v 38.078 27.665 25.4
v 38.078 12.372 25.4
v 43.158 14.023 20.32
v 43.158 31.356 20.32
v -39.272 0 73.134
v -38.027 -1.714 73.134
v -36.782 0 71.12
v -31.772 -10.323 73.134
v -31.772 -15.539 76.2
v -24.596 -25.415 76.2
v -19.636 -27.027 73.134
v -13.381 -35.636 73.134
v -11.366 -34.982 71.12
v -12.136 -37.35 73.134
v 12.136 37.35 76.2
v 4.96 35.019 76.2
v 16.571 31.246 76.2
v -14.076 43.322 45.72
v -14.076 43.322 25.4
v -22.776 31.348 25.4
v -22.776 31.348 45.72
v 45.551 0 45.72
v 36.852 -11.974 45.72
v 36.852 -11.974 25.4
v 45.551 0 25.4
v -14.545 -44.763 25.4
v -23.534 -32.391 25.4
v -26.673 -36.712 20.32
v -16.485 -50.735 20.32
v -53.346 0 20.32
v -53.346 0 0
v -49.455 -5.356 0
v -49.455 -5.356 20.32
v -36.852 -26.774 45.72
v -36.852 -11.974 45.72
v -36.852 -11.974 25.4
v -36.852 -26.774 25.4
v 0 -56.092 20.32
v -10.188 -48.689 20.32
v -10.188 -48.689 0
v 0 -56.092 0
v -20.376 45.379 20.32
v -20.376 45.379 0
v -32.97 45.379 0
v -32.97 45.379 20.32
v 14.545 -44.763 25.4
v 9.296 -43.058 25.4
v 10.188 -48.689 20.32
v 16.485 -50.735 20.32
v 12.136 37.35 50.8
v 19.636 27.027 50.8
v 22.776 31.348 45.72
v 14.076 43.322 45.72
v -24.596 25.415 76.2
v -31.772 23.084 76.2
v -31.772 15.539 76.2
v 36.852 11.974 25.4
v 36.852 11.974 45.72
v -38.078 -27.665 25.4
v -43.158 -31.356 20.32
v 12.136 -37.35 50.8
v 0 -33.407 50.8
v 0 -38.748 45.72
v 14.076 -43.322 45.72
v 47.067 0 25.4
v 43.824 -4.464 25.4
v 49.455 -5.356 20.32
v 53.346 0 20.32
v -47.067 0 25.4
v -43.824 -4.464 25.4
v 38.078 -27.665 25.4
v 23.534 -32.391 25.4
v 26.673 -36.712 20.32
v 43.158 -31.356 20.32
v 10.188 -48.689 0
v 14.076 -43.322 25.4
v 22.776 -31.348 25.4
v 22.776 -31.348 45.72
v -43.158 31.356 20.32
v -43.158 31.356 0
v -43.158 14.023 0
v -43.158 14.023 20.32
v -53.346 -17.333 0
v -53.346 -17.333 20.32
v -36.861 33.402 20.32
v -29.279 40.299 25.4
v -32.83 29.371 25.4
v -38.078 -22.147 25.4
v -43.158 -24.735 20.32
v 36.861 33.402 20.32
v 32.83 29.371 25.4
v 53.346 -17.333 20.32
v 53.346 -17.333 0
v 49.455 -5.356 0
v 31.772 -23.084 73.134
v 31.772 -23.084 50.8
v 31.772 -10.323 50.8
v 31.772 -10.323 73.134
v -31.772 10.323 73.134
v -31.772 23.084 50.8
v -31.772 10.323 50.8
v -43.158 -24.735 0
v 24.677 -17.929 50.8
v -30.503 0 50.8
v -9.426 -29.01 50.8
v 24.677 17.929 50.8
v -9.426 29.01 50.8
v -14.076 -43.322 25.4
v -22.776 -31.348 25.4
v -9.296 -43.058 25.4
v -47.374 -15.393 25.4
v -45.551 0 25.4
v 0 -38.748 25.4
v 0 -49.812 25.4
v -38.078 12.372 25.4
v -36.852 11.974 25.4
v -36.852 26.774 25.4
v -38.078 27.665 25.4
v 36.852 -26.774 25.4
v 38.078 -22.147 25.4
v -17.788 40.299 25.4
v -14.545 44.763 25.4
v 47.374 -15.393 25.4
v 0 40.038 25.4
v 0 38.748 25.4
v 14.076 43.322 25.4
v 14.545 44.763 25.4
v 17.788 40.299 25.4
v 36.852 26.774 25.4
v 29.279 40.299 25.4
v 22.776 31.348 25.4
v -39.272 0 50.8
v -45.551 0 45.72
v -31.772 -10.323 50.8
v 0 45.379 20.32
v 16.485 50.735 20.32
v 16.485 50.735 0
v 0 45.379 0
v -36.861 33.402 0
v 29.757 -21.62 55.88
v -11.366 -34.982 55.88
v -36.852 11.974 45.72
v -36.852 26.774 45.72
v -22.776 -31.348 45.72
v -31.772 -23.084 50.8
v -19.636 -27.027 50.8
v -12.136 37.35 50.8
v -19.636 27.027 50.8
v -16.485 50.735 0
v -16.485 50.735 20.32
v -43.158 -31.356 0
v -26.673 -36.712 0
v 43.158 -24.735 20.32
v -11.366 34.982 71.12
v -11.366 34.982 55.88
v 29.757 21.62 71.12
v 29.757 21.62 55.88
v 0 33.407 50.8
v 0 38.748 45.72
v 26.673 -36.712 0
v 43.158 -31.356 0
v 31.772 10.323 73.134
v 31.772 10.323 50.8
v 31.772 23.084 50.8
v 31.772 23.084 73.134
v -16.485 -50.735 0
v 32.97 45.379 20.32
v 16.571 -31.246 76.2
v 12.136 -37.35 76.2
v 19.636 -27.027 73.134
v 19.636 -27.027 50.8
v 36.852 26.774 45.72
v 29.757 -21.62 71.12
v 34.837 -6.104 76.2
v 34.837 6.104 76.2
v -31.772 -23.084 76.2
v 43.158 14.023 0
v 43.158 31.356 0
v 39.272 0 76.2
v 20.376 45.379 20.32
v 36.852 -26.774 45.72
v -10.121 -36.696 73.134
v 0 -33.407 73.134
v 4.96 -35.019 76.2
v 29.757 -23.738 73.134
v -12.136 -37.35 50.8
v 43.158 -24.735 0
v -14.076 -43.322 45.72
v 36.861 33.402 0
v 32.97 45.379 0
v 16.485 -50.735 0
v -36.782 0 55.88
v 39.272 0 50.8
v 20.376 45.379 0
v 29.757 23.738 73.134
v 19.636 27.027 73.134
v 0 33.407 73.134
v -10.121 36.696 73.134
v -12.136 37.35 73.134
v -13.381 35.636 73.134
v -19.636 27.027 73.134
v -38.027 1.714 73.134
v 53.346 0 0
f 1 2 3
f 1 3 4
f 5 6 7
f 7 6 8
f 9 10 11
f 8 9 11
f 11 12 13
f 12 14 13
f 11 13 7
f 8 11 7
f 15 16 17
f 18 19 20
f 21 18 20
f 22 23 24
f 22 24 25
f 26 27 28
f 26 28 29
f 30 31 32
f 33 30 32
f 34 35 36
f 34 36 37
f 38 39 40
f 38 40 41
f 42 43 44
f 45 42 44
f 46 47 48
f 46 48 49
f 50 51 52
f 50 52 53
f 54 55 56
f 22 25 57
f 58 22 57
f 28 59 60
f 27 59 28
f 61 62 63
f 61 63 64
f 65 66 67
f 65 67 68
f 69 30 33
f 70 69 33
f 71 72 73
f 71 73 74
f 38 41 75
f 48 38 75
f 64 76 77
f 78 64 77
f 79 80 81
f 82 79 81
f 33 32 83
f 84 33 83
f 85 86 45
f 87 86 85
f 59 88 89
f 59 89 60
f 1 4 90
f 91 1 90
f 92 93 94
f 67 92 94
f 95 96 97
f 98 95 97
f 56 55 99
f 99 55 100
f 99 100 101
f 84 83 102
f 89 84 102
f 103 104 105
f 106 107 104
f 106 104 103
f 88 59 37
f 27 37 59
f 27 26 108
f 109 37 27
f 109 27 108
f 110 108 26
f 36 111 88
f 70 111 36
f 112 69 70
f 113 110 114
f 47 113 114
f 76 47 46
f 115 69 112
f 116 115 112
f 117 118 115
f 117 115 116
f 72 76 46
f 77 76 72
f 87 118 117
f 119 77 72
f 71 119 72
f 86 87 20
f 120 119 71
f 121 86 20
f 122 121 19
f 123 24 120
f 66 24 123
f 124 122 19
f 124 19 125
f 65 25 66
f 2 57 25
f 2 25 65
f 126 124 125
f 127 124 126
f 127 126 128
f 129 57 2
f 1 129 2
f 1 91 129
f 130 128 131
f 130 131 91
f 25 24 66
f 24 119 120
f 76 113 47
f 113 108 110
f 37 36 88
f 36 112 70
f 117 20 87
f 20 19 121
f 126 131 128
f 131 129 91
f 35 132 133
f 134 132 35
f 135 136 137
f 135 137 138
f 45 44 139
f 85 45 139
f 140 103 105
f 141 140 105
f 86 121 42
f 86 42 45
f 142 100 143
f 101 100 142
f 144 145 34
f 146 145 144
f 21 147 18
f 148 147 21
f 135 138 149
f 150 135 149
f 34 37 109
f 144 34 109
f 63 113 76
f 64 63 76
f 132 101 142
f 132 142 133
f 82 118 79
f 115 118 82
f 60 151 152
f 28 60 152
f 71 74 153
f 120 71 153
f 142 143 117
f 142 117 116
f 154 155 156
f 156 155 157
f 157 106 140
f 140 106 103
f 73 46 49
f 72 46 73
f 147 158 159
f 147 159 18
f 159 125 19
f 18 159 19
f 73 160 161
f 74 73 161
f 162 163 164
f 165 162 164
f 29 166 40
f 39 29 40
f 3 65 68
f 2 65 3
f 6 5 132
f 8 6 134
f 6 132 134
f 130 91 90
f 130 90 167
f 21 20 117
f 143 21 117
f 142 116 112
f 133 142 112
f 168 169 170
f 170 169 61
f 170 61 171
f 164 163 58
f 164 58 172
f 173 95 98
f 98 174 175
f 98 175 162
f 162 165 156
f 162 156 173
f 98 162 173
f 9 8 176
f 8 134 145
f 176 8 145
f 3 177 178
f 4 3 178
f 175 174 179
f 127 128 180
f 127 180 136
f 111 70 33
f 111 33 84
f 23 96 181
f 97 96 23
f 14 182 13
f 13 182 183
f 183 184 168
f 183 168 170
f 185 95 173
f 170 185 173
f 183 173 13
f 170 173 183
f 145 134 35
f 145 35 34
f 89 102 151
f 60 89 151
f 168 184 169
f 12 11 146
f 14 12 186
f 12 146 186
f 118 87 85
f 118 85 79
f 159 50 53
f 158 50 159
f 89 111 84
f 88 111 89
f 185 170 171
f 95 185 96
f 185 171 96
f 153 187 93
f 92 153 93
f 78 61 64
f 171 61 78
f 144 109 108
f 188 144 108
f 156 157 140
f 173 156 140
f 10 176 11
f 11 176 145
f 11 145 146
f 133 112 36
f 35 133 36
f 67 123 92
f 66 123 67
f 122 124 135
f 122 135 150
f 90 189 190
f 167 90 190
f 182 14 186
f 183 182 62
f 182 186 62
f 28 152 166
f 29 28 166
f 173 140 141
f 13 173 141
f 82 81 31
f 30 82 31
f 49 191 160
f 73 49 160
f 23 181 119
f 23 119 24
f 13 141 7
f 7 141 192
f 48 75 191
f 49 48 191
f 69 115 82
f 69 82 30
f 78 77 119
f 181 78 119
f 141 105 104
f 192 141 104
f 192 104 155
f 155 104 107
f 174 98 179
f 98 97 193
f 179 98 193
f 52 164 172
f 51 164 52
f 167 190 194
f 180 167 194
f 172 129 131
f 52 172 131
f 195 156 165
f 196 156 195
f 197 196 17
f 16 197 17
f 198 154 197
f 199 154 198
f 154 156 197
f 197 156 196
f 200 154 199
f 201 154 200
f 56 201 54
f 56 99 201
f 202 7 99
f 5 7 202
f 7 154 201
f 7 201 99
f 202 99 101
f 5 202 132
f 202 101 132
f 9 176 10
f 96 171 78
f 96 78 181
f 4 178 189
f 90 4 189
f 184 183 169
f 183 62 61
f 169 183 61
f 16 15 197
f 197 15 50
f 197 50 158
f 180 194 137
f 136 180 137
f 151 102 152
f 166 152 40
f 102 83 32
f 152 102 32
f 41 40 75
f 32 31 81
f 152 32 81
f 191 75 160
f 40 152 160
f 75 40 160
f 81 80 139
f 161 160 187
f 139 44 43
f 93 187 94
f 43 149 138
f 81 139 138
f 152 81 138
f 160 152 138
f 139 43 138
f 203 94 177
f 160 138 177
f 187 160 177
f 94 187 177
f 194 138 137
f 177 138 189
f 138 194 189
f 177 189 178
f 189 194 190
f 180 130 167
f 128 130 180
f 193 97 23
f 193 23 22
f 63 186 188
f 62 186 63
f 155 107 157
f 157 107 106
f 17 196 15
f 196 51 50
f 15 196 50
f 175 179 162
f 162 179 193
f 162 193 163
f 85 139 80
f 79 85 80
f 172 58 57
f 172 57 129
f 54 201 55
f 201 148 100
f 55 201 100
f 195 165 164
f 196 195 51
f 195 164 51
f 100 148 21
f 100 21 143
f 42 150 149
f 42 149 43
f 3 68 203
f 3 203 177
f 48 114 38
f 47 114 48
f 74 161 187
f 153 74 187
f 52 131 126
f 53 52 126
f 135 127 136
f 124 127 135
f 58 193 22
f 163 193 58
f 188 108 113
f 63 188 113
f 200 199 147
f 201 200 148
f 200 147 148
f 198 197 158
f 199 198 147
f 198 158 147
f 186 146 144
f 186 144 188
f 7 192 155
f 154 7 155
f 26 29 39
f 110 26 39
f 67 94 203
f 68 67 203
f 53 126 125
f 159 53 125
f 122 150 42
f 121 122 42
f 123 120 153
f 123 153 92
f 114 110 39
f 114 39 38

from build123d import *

# Parameters (mm, degrees)
F1_DEPTH      = 25.4
F2_SIZE       = 5.08
F4_DEPTH      = 25.4
F5_SIZE       = 5.08
F7_DEPTH      = 25.4
F8_SIZE       = 5.08
F9_T4_DEPTH   = 69.3683527658
F9_T10_DEPTH  = 69.3683527658
F9_T16_DEPTH  = 69.3683527658
F9_T22_DEPTH  = 69.3683527658
F9_T28_DEPTH  = 69.3683527658
F9_T35_DEPTH  = 69.3683527658
F9_T41_DEPTH  = 69.3683527658
F9_T50_DEPTH  = 69.3683527658
F9_T56_DEPTH  = 69.3683527658
F9_T65_DEPTH  = 69.3683527658
F9_T71_DEPTH  = 69.3683527658
F9_T80_DEPTH  = 69.3683527658
F9_T86_DEPTH  = 69.3683527658
F9_T95_DEPTH  = 69.3683527658
F9_T101_DEPTH = 69.3683527658


# Not quite as in the source:
# - a fillet or chamfer that OpenCascade refuses, or shapes differently, is made with other operations: its cross-section is extruded or revolved along the edge and cut away or added


with BuildPart() as f1:
    # F0 (on Top) → F1 (new body)
    with BuildSketch(Plane.XY):
        Polygon((43.1581027806, 14.0229176455), (43.1581027806, 31.3561970981), (36.8614204445, 33.40211321), align=None)
        Polygon((49.4547851167, -5.3562779191), (43.1581027806, 14.0229176455), (43.1581027806, -14.0229176455), align=None)
        Polygon((43.1581027806, -14.0229176455), (43.1581027806, 14.0229176455), (26.6731744084, 36.7124750172), (0, 45.3791147436), (-26.6731744084, 36.7124750172), (-43.1581027806, 14.0229176455), (-43.1581027806, -14.0229176455), (-26.6731744084, -36.7124750172), (0, -45.3791147436), (26.6731744084, -36.7124750172), align=None)
        Polygon((26.6731744084, 36.7124750172), (43.1581027806, 14.0229176455), (36.8614204445, 33.40211321), align=None)
        Polygon((53.3463488167, 0), (43.1581027806, 14.0229176455), (49.4547851167, -5.3562779191), align=None)
        Polygon((26.6731744084, 36.7124750172), (36.8614204445, 33.40211321), (32.9698567444, 45.3791147436), (20.3764920723, 45.3791147436), align=None)
        Polygon((49.4547851167, -5.3562779191), (43.1581027806, -14.0229176455), (43.1581027806, -24.7354734837), (53.3463488167, -17.3332794527), align=None)
        Polygon((43.1581027806, -24.7354734837), (43.1581027806, -14.0229176455), (26.6731744084, -36.7124750172), align=None)
        Polygon((0, 45.3791147436), (26.6731744084, 36.7124750172), (20.3764920723, 45.3791147436), align=None)
        Polygon((43.1581027806, -31.3561970981), (43.1581027806, -24.7354734837), (26.6731744084, -36.7124750172), align=None)
        Polygon((10.1882460361, -48.6894765508), (26.6731744084, -36.7124750172), (0, -45.3791147436), align=None)
        Polygon((16.4849283722, -50.7353926627), (26.6731744084, -36.7124750172), (10.1882460361, -48.6894765508), align=None)
        Polygon((-20.3764920723, 45.3791147436), (0, 45.3791147436), (-16.4849283722, 50.7353926627), align=None)
        Polygon((-26.6731744084, 36.7124750172), (0, 45.3791147436), (-20.3764920723, 45.3791147436), align=None)
        Polygon((16.4849283722, 50.7353926627), (0, 45.3791147436), (20.3764920723, 45.3791147436), align=None)
        Polygon((10.1882460361, -48.6894765508), (0, -45.3791147436), (-10.1882460361, -48.6894765508), (0, -56.0916705818), align=None)
        Polygon((-10.1882460361, -48.6894765508), (0, -45.3791147436), (-26.6731744084, -36.7124750172), align=None)
        Polygon((-36.8614204445, 33.40211321), (-26.6731744084, 36.7124750172), (-20.3764920723, 45.3791147436), (-32.9698567444, 45.3791147436), align=None)
        Polygon((-43.1581027806, 14.0229176455), (-26.6731744084, 36.7124750172), (-36.8614204445, 33.40211321), align=None)
        Polygon((-16.4849283722, -50.7353926627), (-10.1882460361, -48.6894765508), (-26.6731744084, -36.7124750172), align=None)
        Polygon((-43.1581027806, -24.7354734837), (-26.6731744084, -36.7124750172), (-43.1581027806, -14.0229176455), align=None)
        Polygon((-43.1581027806, -31.3561970981), (-26.6731744084, -36.7124750172), (-43.1581027806, -24.7354734837), align=None)
        Polygon((-49.4547851167, -5.3562779191), (-43.1581027806, 14.0229176455), (-53.3463488167, 0), align=None)
        Polygon((-43.1581027806, -14.0229176455), (-43.1581027806, 14.0229176455), (-49.4547851167, -5.3562779191), align=None)
        Polygon((-43.1581027806, 31.3561970981), (-43.1581027806, 14.0229176455), (-36.8614204445, 33.40211321), align=None)
        Polygon((-43.1581027806, -24.7354734837), (-43.1581027806, -14.0229176455), (-49.4547851167, -5.3562779191), (-53.3463488167, -17.3332794527), align=None)
    extrude(amount=F1_DEPTH)

    # F2
    f2_edges = [f1.edges().sort_by_distance(p)[0] for p in [
        (43.158103, 22.689557, 25.4),
        (40.009762, 32.379155, 25.4),
        (34.915639, 39.390614, 25.4),
        (26.673174, 45.379115, 25.4),
        (18.43071, 48.057254, 25.4),
        (8.242464, 48.057254, 25.4),
        (-8.242464, 48.057254, 25.4),
        (-18.43071, 48.057254, 25.4),
        (-26.673174, 45.379115, 25.4),
        (-34.915639, 39.390614, 25.4),
        (-40.009762, 32.379155, 25.4),
        (-43.158103, 22.689557, 25.4),
        (-48.252226, 7.011459, 25.4),
        (-51.400567, -2.678139, 25.4),
        (-51.400567, -11.344779, 25.4),
        (-48.252226, -21.034376, 25.4),
        (-43.158103, -28.045835, 25.4),
        (-34.915639, -34.034336, 25.4),
        (-21.579051, -43.723934, 25.4),
        (-13.336587, -49.712435, 25.4),
        (-5.094123, -52.390574, 25.4),
        (5.094123, -52.390574, 25.4),
        (13.336587, -49.712435, 25.4),
        (21.579051, -43.723934, 25.4),
        (34.915639, -34.034336, 25.4),
        (43.158103, -28.045835, 25.4),
        (48.252226, -21.034376, 25.4),
        (51.400567, -11.344779, 25.4),
        (51.400567, -2.678139, 25.4),
        (48.252226, 7.011459, 25.4),
    ]]
    chamfer(f2_edges, length=F2_SIZE)

    # F3 (on face) → F4 (join)
    with BuildSketch(Plane.XY.offset(25.4)):
        Polygon((36.8518978357, 11.9739074504), (36.8518978357, 26.7744710154), (22.7757254124, 31.3480966833), align=None)
        Polygon((45.5514508248, 0), (36.8518978357, 11.9739074504), (36.8518978357, -11.9739074504), align=None)
        Polygon((36.8518978357, -11.9739074504), (36.8518978357, 11.9739074504), (22.7757254124, 31.3480966833), (0, 38.7483784658), (-22.7757254124, 31.3480966833), (-36.8518978357, 11.9739074504), (-36.8518978357, -11.9739074504), (-22.7757254124, -31.3480966833), (0, -38.7483784658), (22.7757254124, -31.3480966833), align=None)
        Polygon((0, 38.7483784658), (22.7757254124, 31.3480966833), (14.0761724233, 43.3220041337), align=None)
        Polygon((36.8518978357, -26.7744710154), (36.8518978357, -11.9739074504), (22.7757254124, -31.3480966833), align=None)
        Polygon((-22.7757254124, 31.3480966833), (0, 38.7483784658), (-14.0761724233, 43.3220041337), align=None)
        Polygon((14.0761724233, -43.3220041337), (22.7757254124, -31.3480966833), (0, -38.7483784658), align=None)
        Polygon((-36.8518978357, 11.9739074504), (-22.7757254124, 31.3480966833), (-36.8518978357, 26.7744710154), align=None)
        Polygon((-14.0761724233, -43.3220041337), (0, -38.7483784658), (-22.7757254124, -31.3480966833), align=None)
        Polygon((-36.8518978357, -11.9739074504), (-36.8518978357, 11.9739074504), (-45.5514508248, 0), align=None)
        Polygon((-36.8518978357, -26.7744710154), (-22.7757254124, -31.3480966833), (-36.8518978357, -11.9739074504), align=None)
    extrude(amount=F4_DEPTH)

    # F5
    f5_edges = [f1.edges().sort_by_distance(p)[0] for p in [
        (36.851898, 19.374189, 50.8),
        (29.813812, 29.061284, 50.8),
        (18.425949, 37.33505, 50.8),
        (7.038086, 41.035191, 50.8),
        (-7.038086, 41.035191, 50.8),
        (-18.425949, 37.33505, 50.8),
        (-29.813812, 29.061284, 50.8),
        (-36.851898, 19.374189, 50.8),
        (-41.201674, 5.986954, 50.8),
        (-41.201674, -5.986954, 50.8),
        (-36.851898, -19.374189, 50.8),
        (-29.813812, -29.061284, 50.8),
        (-18.425949, -37.33505, 50.8),
        (-7.038086, -41.035191, 50.8),
        (7.038086, -41.035191, 50.8),
        (18.425949, -37.33505, 50.8),
        (29.813812, -29.061284, 50.8),
        (36.851898, -19.374189, 50.8),
        (41.201674, -5.986954, 50.8),
        (41.201674, 5.986954, 50.8),
    ]]
    chamfer(f5_edges, length=F5_SIZE)

    # F6 (on face) → F7 (join)
    with BuildSketch(Plane.XY.offset(50.8)):
        Polygon((39.2722254991, 0), (31.7718978357, 10.3233153935), (31.7718978357, 23.0836349731), (19.6361127496, 27.0267905768), (12.1357850862, 37.3501059704), (0, 33.4069503666), (-12.1357850862, 37.3501059704), (-19.6361127496, 27.0267905768), (-31.7718978357, 23.0836349731), (-31.7718978357, 10.3233153935), (-39.2722254991, 0), (-31.7718978357, -10.3233153935), (-31.7718978357, -23.0836349731), (-19.6361127496, -27.0267905768), (-12.1357850862, -37.3501059704), (0, -33.4069503666), (12.1357850862, -37.3501059704), (19.6361127496, -27.0267905768), (31.7718978357, -23.0836349731), (31.7718978357, -10.3233153935), align=None)
        Polygon((-11.3663207357, 34.9819382066), (29.7574140131, 21.620026804), (29.7574140131, -21.620026804), (-11.3663207357, -34.9819382066), (-36.7821865549, 0), align=None, mode=Mode.SUBTRACT)
    extrude(amount=F7_DEPTH)

    # F8
    f8_edges = [f1.edges().sort_by_distance(p)[0] for p in [
        (9.195547, 28.300983, 50.8),
        (29.757414, 0, 50.8),
        (9.195547, -28.300983, 50.8),
        (-24.074254, -17.490969, 50.8),
        (-24.074254, 17.490969, 50.8),
    ]]
    chamfer(f8_edges, length=F8_SIZE)

    # F9: chamfer of 5.08 on 5 edges, made by hand


with BuildPart() as f9_tool2:
    # F9_s3 → F9_t4 (new body)
    with BuildSketch(Plane(origin=(-20.3868473658, -28.0600881296, 0), x_dir=(0, 0, 1), z_dir=(0.5877852523, 0.8090169944, 0))):
        Polygon((71.12, -29.7574140131), (76.2, -34.8374140131), (76.2, -29.7574140131), align=None)
    extrude(amount=F9_T4_DEPTH)

    split(bisect_by=Plane(origin=(9.1955466387, 28.3009825053, 0), x_dir=(0, 0, 1), z_dir=(-0.3090169944, -0.9510565163, 0)), keep=Keep.TOP)

    split(bisect_by=Plane(origin=(-24.0742536453, -17.4909691033, 0), x_dir=(0, 0, 1), z_dir=(0.8090169944, 0.5877852523, 0)), keep=Keep.TOP)


with BuildPart() as f1_1:
    add(f1.part)

    # F9_t1: cut F9_tool2
    add(f9_tool2.part, mode=Mode.SUBTRACT)


with BuildPart() as f9_tool8:
    # F9_s9 → F9_t10 (new body)
    with BuildSketch(Plane(origin=(-32.9866119613, 10.7179999382, 0), x_dir=(0, 0, 1), z_dir=(0.9510565163, -0.3090169944, 0))):
        Polygon((71.12, -29.7574140131), (76.2, -34.8374140131), (76.2, -29.7574140131), align=None)
    extrude(amount=F9_T10_DEPTH)

    split(bisect_by=Plane(origin=(-24.0742536453, 17.4909691033, 0), x_dir=(0, 0, 1), z_dir=(0.8090169944, -0.5877852523, 0)), keep=Keep.TOP)

    split(bisect_by=Plane.YZ.offset(29.7574140131), keep=Keep.BOTTOM)


with BuildPart() as f1_2:
    add(f1_1.part)

    # F9_t7: cut F9_tool8
    add(f9_tool8.part, mode=Mode.SUBTRACT)


with BuildPart() as f9_tool14:
    # F9_s15 → F9_t16 (new body)
    with BuildSketch(Plane.XZ.offset(-34.6841763829)):
        Polygon((34.8374140131, 76.2), (29.7574140131, 71.12), (29.7574140131, 76.2), align=None)
    extrude(amount=F9_T16_DEPTH)

    split(bisect_by=Plane(origin=(9.1955466387, 28.3009825053, 0), x_dir=(0, 0, 1), z_dir=(-0.3090169944, -0.9510565163, 0)), keep=Keep.TOP)

    split(bisect_by=Plane(origin=(9.1955466387, -28.3009825053, 0), x_dir=(0, 0, 1), z_dir=(-0.3090169944, 0.9510565163, 0)), keep=Keep.TOP)


with BuildPart() as f1_3:
    add(f1_2.part)

    # F9_t13: cut F9_tool14
    add(f9_tool14.part, mode=Mode.SUBTRACT)


with BuildPart() as f9_tool20:
    # F9_s21 → F9_t22 (new body)
    with BuildSketch(Plane(origin=(32.9866119613, 10.7179999382, 0), x_dir=(0, 0, 1), z_dir=(-0.9510565163, -0.3090169944, 0))):
        Polygon((76.2, -34.8374140131), (71.12, -29.7574140131), (76.2, -29.7574140131), align=None)
    extrude(amount=F9_T22_DEPTH)

    split(bisect_by=Plane.YZ.offset(29.7574140131), keep=Keep.BOTTOM)

    split(bisect_by=Plane(origin=(-24.0742536453, -17.4909691033, 0), x_dir=(0, 0, 1), z_dir=(0.8090169944, 0.5877852523, 0)), keep=Keep.TOP)


with BuildPart() as f1_4:
    add(f1_3.part)

    # F9_t19: cut F9_tool20
    add(f9_tool20.part, mode=Mode.SUBTRACT)


with BuildPart() as f9_tool26:
    # F9_s27 → F9_t28 (new body)
    with BuildSketch(Plane(origin=(20.3868473658, -28.0600881296, 0), x_dir=(0, 0, 1), z_dir=(-0.5877852523, 0.8090169944, 0))):
        Polygon((76.2, -34.8374140131), (71.12, -29.7574140131), (76.2, -29.7574140131), align=None)
    extrude(amount=F9_T28_DEPTH)

    split(bisect_by=Plane(origin=(-24.0742536453, 17.4909691033, 0), x_dir=(0, 0, 1), z_dir=(0.8090169944, -0.5877852523, 0)), keep=Keep.TOP)

    split(bisect_by=Plane(origin=(9.1955466387, -28.3009825053, 0), x_dir=(0, 0, 1), z_dir=(-0.3090169944, 0.9510565163, 0)), keep=Keep.TOP)


with BuildPart() as f1_5:
    add(f1_4.part)

    # F9_t25: cut F9_tool26
    add(f9_tool26.part, mode=Mode.SUBTRACT)


with BuildPart() as f9_tool33:
    # F9_s34 → F9_t35 (new body)
    with BuildSketch(Plane(origin=(-20.3868473658, -28.0600881296, 0), x_dir=(0, 0, 1), z_dir=(0.5877852523, 0.8090169944, 0))):
        Polygon((71.12, -29.7574140131), (76.2, -34.8374140131), (76.2, -29.7574140131), align=None)
    extrude(amount=F9_T35_DEPTH)

    split(bisect_by=Plane(origin=(-24.0742536453, -17.4909691033, 0), x_dir=(0, 0, 1), z_dir=(-0.8090169944, -0.5877852523, 0)), keep=Keep.TOP)

    split(bisect_by=Plane(origin=(-25.7040052927, 18.6750529852, 0), x_dir=(0, 0, 1), z_dir=(0.8090169944, -0.5877852523, 0)), keep=Keep.TOP)

    split(bisect_by=Plane(origin=(-25.7040052927, -18.6750529852, 0), x_dir=(0, 0, 1), z_dir=(0.8090169944, 0.5877852523, 0)), keep=Keep.TOP)


with BuildPart() as f9_tool39:
    # F9_s40 → F9_t41 (new body)
    with BuildSketch(Plane(origin=(20.3868473658, -28.0600881296, 0), x_dir=(0, 0, 1), z_dir=(-0.5877852523, 0.8090169944, 0))):
        Polygon((76.2, -34.8374140131), (71.12, -29.7574140131), (76.2, -29.7574140131), align=None)
    extrude(amount=F9_T41_DEPTH)

    split(bisect_by=Plane(origin=(-24.0742536453, 17.4909691033, 0), x_dir=(0, 0, 1), z_dir=(-0.8090169944, 0.5877852523, 0)), keep=Keep.TOP)

    split(bisect_by=Plane(origin=(-25.7040052927, 18.6750529852, 0), x_dir=(0, 0, 1), z_dir=(0.8090169944, -0.5877852523, 0)), keep=Keep.TOP)

    split(bisect_by=Plane(origin=(-25.7040052927, -18.6750529852, 0), x_dir=(0, 0, 1), z_dir=(0.8090169944, 0.5877852523, 0)), keep=Keep.TOP)


with BuildPart() as f9_tool33_1:
    add(f9_tool33.part)

    # F9_t45: intersect F9_tool39
    add(f9_tool39.part, mode=Mode.INTERSECT)


with BuildPart() as f1_6:
    add(f1_5.part)

    # F9_t31: cut F9_tool33
    add(f9_tool33_1.part, mode=Mode.SUBTRACT)


with BuildPart() as f9_tool48:
    # F9_s49 → F9_t50 (new body)
    with BuildSketch(Plane(origin=(-32.9866119613, 10.7179999382, 0), x_dir=(0, 0, 1), z_dir=(0.9510565163, -0.3090169944, 0))):
        Polygon((71.12, -29.7574140131), (76.2, -34.8374140131), (76.2, -29.7574140131), align=None)
    extrude(amount=F9_T50_DEPTH)

    split(bisect_by=Plane(origin=(-24.0742536453, 17.4909691033, 0), x_dir=(0, 0, 1), z_dir=(-0.8090169944, 0.5877852523, 0)), keep=Keep.TOP)

    split(bisect_by=Plane(origin=(9.8180563748, 30.2168704717, 0), x_dir=(0, 0, 1), z_dir=(-0.3090169944, -0.9510565163, 0)), keep=Keep.TOP)

    split(bisect_by=Plane(origin=(-25.7040052927, 18.6750529852, 0), x_dir=(0, 0, 1), z_dir=(0.8090169944, -0.5877852523, 0)), keep=Keep.TOP)


with BuildPart() as f9_tool54:
    # F9_s55 → F9_t56 (new body)
    with BuildSketch(Plane(origin=(-20.3868473658, -28.0600881296, 0), x_dir=(0, 0, 1), z_dir=(0.5877852523, 0.8090169944, 0))):
        Polygon((71.12, -29.7574140131), (76.2, -34.8374140131), (76.2, -29.7574140131), align=None)
    extrude(amount=F9_T56_DEPTH)

    split(bisect_by=Plane(origin=(9.1955466387, 28.3009825053, 0), x_dir=(0, 0, 1), z_dir=(0.3090169944, 0.9510565163, 0)), keep=Keep.TOP)

    split(bisect_by=Plane(origin=(9.8180563748, 30.2168704717, 0), x_dir=(0, 0, 1), z_dir=(-0.3090169944, -0.9510565163, 0)), keep=Keep.TOP)

    split(bisect_by=Plane(origin=(-25.7040052927, 18.6750529852, 0), x_dir=(0, 0, 1), z_dir=(0.8090169944, -0.5877852523, 0)), keep=Keep.TOP)


with BuildPart() as f9_tool48_1:
    add(f9_tool48.part)

    # F9_t60: intersect F9_tool54
    add(f9_tool54.part, mode=Mode.INTERSECT)


with BuildPart() as f1_7:
    add(f1_6.part)

    # F9_t46: cut F9_tool48
    add(f9_tool48_1.part, mode=Mode.SUBTRACT)


with BuildPart() as f9_tool63:
    # F9_s64 → F9_t65 (new body)
    with BuildSketch(Plane(origin=(-32.9866119613, 10.7179999382, 0), x_dir=(0, 0, 1), z_dir=(0.9510565163, -0.3090169944, 0))):
        Polygon((71.12, -29.7574140131), (76.2, -34.8374140131), (76.2, -29.7574140131), align=None)
    extrude(amount=F9_T65_DEPTH)

    split(bisect_by=Plane.YZ.offset(29.7574140131), keep=Keep.TOP)

    split(bisect_by=Plane.YZ.offset(31.7718978357), keep=Keep.BOTTOM)

    split(bisect_by=Plane(origin=(9.8180563748, 30.2168704717, 0), x_dir=(0, 0, 1), z_dir=(-0.3090169944, -0.9510565163, 0)), keep=Keep.TOP)


with BuildPart() as f9_tool69:
    # F9_s70 → F9_t71 (new body)
    with BuildSketch(Plane.XZ.offset(-34.6841763829)):
        Polygon((34.8374140131, 76.2), (29.7574140131, 71.12), (29.7574140131, 76.2), align=None)
    extrude(amount=F9_T71_DEPTH)

    split(bisect_by=Plane(origin=(9.1955466387, 28.3009825053, 0), x_dir=(0, 0, 1), z_dir=(0.3090169944, 0.9510565163, 0)), keep=Keep.TOP)

    split(bisect_by=Plane.YZ.offset(31.7718978357), keep=Keep.BOTTOM)

    split(bisect_by=Plane(origin=(9.8180563748, 30.2168704717, 0), x_dir=(0, 0, 1), z_dir=(-0.3090169944, -0.9510565163, 0)), keep=Keep.TOP)


with BuildPart() as f9_tool63_1:
    add(f9_tool63.part)

    # F9_t75: intersect F9_tool69
    add(f9_tool69.part, mode=Mode.INTERSECT)


with BuildPart() as f1_8:
    add(f1_7.part)

    # F9_t61: cut F9_tool63
    add(f9_tool63_1.part, mode=Mode.SUBTRACT)


with BuildPart() as f9_tool78:
    # F9_s79 → F9_t80 (new body)
    with BuildSketch(Plane.XZ.offset(-34.6841763829)):
        Polygon((34.8374140131, 76.2), (29.7574140131, 71.12), (29.7574140131, 76.2), align=None)
    extrude(amount=F9_T80_DEPTH)

    split(bisect_by=Plane(origin=(9.8180563748, -30.2168704717, 0), x_dir=(0, 0, 1), z_dir=(-0.3090169944, 0.9510565163, 0)), keep=Keep.TOP)

    split(bisect_by=Plane.YZ.offset(31.7718978357), keep=Keep.BOTTOM)

    split(bisect_by=Plane(origin=(9.1955466387, -28.3009825053, 0), x_dir=(0, 0, 1), z_dir=(0.3090169944, -0.9510565163, 0)), keep=Keep.TOP)


with BuildPart() as f9_tool84:
    # F9_s85 → F9_t86 (new body)
    with BuildSketch(Plane(origin=(32.9866119613, 10.7179999382, 0), x_dir=(0, 0, 1), z_dir=(-0.9510565163, -0.3090169944, 0))):
        Polygon((76.2, -34.8374140131), (71.12, -29.7574140131), (76.2, -29.7574140131), align=None)
    extrude(amount=F9_T86_DEPTH)

    split(bisect_by=Plane.YZ.offset(29.7574140131), keep=Keep.TOP)

    split(bisect_by=Plane(origin=(9.8180563748, -30.2168704717, 0), x_dir=(0, 0, 1), z_dir=(-0.3090169944, 0.9510565163, 0)), keep=Keep.TOP)

    split(bisect_by=Plane.YZ.offset(31.7718978357), keep=Keep.BOTTOM)


with BuildPart() as f9_tool78_1:
    add(f9_tool78.part)

    # F9_t90: intersect F9_tool84
    add(f9_tool84.part, mode=Mode.INTERSECT)


with BuildPart() as f1_9:
    add(f1_8.part)

    # F9_t76: cut F9_tool78
    add(f9_tool78_1.part, mode=Mode.SUBTRACT)


with BuildPart() as f9_tool93:
    # F9_s94 → F9_t95 (new body)
    with BuildSketch(Plane(origin=(32.9866119613, 10.7179999382, 0), x_dir=(0, 0, 1), z_dir=(-0.9510565163, -0.3090169944, 0))):
        Polygon((76.2, -34.8374140131), (71.12, -29.7574140131), (76.2, -29.7574140131), align=None)
    extrude(amount=F9_T95_DEPTH)

    split(bisect_by=Plane(origin=(-24.0742536453, -17.4909691033, 0), x_dir=(0, 0, 1), z_dir=(-0.8090169944, -0.5877852523, 0)), keep=Keep.TOP)

    split(bisect_by=Plane(origin=(9.8180563748, -30.2168704717, 0), x_dir=(0, 0, 1), z_dir=(-0.3090169944, 0.9510565163, 0)), keep=Keep.TOP)

    split(bisect_by=Plane(origin=(-25.7040052927, -18.6750529852, 0), x_dir=(0, 0, 1), z_dir=(0.8090169944, 0.5877852523, 0)), keep=Keep.TOP)


with BuildPart() as f9_tool99:
    # F9_s100 → F9_t101 (new body)
    with BuildSketch(Plane(origin=(20.3868473658, -28.0600881296, 0), x_dir=(0, 0, 1), z_dir=(-0.5877852523, 0.8090169944, 0))):
        Polygon((76.2, -34.8374140131), (71.12, -29.7574140131), (76.2, -29.7574140131), align=None)
    extrude(amount=F9_T101_DEPTH)

    split(bisect_by=Plane(origin=(-25.7040052927, -18.6750529852, 0), x_dir=(0, 0, 1), z_dir=(0.8090169944, 0.5877852523, 0)), keep=Keep.TOP)

    split(bisect_by=Plane(origin=(9.8180563748, -30.2168704717, 0), x_dir=(0, 0, 1), z_dir=(-0.3090169944, 0.9510565163, 0)), keep=Keep.TOP)

    split(bisect_by=Plane(origin=(9.1955466387, -28.3009825053, 0), x_dir=(0, 0, 1), z_dir=(0.3090169944, -0.9510565163, 0)), keep=Keep.TOP)


with BuildPart() as f9_tool93_1:
    add(f9_tool93.part)

    # F9_t105: intersect F9_tool99
    add(f9_tool99.part, mode=Mode.INTERSECT)


with BuildPart() as f1_10:
    add(f1_9.part)

    # F9_t91: cut F9_tool93
    add(f9_tool93_1.part, mode=Mode.SUBTRACT)


solid = f1_10.part
